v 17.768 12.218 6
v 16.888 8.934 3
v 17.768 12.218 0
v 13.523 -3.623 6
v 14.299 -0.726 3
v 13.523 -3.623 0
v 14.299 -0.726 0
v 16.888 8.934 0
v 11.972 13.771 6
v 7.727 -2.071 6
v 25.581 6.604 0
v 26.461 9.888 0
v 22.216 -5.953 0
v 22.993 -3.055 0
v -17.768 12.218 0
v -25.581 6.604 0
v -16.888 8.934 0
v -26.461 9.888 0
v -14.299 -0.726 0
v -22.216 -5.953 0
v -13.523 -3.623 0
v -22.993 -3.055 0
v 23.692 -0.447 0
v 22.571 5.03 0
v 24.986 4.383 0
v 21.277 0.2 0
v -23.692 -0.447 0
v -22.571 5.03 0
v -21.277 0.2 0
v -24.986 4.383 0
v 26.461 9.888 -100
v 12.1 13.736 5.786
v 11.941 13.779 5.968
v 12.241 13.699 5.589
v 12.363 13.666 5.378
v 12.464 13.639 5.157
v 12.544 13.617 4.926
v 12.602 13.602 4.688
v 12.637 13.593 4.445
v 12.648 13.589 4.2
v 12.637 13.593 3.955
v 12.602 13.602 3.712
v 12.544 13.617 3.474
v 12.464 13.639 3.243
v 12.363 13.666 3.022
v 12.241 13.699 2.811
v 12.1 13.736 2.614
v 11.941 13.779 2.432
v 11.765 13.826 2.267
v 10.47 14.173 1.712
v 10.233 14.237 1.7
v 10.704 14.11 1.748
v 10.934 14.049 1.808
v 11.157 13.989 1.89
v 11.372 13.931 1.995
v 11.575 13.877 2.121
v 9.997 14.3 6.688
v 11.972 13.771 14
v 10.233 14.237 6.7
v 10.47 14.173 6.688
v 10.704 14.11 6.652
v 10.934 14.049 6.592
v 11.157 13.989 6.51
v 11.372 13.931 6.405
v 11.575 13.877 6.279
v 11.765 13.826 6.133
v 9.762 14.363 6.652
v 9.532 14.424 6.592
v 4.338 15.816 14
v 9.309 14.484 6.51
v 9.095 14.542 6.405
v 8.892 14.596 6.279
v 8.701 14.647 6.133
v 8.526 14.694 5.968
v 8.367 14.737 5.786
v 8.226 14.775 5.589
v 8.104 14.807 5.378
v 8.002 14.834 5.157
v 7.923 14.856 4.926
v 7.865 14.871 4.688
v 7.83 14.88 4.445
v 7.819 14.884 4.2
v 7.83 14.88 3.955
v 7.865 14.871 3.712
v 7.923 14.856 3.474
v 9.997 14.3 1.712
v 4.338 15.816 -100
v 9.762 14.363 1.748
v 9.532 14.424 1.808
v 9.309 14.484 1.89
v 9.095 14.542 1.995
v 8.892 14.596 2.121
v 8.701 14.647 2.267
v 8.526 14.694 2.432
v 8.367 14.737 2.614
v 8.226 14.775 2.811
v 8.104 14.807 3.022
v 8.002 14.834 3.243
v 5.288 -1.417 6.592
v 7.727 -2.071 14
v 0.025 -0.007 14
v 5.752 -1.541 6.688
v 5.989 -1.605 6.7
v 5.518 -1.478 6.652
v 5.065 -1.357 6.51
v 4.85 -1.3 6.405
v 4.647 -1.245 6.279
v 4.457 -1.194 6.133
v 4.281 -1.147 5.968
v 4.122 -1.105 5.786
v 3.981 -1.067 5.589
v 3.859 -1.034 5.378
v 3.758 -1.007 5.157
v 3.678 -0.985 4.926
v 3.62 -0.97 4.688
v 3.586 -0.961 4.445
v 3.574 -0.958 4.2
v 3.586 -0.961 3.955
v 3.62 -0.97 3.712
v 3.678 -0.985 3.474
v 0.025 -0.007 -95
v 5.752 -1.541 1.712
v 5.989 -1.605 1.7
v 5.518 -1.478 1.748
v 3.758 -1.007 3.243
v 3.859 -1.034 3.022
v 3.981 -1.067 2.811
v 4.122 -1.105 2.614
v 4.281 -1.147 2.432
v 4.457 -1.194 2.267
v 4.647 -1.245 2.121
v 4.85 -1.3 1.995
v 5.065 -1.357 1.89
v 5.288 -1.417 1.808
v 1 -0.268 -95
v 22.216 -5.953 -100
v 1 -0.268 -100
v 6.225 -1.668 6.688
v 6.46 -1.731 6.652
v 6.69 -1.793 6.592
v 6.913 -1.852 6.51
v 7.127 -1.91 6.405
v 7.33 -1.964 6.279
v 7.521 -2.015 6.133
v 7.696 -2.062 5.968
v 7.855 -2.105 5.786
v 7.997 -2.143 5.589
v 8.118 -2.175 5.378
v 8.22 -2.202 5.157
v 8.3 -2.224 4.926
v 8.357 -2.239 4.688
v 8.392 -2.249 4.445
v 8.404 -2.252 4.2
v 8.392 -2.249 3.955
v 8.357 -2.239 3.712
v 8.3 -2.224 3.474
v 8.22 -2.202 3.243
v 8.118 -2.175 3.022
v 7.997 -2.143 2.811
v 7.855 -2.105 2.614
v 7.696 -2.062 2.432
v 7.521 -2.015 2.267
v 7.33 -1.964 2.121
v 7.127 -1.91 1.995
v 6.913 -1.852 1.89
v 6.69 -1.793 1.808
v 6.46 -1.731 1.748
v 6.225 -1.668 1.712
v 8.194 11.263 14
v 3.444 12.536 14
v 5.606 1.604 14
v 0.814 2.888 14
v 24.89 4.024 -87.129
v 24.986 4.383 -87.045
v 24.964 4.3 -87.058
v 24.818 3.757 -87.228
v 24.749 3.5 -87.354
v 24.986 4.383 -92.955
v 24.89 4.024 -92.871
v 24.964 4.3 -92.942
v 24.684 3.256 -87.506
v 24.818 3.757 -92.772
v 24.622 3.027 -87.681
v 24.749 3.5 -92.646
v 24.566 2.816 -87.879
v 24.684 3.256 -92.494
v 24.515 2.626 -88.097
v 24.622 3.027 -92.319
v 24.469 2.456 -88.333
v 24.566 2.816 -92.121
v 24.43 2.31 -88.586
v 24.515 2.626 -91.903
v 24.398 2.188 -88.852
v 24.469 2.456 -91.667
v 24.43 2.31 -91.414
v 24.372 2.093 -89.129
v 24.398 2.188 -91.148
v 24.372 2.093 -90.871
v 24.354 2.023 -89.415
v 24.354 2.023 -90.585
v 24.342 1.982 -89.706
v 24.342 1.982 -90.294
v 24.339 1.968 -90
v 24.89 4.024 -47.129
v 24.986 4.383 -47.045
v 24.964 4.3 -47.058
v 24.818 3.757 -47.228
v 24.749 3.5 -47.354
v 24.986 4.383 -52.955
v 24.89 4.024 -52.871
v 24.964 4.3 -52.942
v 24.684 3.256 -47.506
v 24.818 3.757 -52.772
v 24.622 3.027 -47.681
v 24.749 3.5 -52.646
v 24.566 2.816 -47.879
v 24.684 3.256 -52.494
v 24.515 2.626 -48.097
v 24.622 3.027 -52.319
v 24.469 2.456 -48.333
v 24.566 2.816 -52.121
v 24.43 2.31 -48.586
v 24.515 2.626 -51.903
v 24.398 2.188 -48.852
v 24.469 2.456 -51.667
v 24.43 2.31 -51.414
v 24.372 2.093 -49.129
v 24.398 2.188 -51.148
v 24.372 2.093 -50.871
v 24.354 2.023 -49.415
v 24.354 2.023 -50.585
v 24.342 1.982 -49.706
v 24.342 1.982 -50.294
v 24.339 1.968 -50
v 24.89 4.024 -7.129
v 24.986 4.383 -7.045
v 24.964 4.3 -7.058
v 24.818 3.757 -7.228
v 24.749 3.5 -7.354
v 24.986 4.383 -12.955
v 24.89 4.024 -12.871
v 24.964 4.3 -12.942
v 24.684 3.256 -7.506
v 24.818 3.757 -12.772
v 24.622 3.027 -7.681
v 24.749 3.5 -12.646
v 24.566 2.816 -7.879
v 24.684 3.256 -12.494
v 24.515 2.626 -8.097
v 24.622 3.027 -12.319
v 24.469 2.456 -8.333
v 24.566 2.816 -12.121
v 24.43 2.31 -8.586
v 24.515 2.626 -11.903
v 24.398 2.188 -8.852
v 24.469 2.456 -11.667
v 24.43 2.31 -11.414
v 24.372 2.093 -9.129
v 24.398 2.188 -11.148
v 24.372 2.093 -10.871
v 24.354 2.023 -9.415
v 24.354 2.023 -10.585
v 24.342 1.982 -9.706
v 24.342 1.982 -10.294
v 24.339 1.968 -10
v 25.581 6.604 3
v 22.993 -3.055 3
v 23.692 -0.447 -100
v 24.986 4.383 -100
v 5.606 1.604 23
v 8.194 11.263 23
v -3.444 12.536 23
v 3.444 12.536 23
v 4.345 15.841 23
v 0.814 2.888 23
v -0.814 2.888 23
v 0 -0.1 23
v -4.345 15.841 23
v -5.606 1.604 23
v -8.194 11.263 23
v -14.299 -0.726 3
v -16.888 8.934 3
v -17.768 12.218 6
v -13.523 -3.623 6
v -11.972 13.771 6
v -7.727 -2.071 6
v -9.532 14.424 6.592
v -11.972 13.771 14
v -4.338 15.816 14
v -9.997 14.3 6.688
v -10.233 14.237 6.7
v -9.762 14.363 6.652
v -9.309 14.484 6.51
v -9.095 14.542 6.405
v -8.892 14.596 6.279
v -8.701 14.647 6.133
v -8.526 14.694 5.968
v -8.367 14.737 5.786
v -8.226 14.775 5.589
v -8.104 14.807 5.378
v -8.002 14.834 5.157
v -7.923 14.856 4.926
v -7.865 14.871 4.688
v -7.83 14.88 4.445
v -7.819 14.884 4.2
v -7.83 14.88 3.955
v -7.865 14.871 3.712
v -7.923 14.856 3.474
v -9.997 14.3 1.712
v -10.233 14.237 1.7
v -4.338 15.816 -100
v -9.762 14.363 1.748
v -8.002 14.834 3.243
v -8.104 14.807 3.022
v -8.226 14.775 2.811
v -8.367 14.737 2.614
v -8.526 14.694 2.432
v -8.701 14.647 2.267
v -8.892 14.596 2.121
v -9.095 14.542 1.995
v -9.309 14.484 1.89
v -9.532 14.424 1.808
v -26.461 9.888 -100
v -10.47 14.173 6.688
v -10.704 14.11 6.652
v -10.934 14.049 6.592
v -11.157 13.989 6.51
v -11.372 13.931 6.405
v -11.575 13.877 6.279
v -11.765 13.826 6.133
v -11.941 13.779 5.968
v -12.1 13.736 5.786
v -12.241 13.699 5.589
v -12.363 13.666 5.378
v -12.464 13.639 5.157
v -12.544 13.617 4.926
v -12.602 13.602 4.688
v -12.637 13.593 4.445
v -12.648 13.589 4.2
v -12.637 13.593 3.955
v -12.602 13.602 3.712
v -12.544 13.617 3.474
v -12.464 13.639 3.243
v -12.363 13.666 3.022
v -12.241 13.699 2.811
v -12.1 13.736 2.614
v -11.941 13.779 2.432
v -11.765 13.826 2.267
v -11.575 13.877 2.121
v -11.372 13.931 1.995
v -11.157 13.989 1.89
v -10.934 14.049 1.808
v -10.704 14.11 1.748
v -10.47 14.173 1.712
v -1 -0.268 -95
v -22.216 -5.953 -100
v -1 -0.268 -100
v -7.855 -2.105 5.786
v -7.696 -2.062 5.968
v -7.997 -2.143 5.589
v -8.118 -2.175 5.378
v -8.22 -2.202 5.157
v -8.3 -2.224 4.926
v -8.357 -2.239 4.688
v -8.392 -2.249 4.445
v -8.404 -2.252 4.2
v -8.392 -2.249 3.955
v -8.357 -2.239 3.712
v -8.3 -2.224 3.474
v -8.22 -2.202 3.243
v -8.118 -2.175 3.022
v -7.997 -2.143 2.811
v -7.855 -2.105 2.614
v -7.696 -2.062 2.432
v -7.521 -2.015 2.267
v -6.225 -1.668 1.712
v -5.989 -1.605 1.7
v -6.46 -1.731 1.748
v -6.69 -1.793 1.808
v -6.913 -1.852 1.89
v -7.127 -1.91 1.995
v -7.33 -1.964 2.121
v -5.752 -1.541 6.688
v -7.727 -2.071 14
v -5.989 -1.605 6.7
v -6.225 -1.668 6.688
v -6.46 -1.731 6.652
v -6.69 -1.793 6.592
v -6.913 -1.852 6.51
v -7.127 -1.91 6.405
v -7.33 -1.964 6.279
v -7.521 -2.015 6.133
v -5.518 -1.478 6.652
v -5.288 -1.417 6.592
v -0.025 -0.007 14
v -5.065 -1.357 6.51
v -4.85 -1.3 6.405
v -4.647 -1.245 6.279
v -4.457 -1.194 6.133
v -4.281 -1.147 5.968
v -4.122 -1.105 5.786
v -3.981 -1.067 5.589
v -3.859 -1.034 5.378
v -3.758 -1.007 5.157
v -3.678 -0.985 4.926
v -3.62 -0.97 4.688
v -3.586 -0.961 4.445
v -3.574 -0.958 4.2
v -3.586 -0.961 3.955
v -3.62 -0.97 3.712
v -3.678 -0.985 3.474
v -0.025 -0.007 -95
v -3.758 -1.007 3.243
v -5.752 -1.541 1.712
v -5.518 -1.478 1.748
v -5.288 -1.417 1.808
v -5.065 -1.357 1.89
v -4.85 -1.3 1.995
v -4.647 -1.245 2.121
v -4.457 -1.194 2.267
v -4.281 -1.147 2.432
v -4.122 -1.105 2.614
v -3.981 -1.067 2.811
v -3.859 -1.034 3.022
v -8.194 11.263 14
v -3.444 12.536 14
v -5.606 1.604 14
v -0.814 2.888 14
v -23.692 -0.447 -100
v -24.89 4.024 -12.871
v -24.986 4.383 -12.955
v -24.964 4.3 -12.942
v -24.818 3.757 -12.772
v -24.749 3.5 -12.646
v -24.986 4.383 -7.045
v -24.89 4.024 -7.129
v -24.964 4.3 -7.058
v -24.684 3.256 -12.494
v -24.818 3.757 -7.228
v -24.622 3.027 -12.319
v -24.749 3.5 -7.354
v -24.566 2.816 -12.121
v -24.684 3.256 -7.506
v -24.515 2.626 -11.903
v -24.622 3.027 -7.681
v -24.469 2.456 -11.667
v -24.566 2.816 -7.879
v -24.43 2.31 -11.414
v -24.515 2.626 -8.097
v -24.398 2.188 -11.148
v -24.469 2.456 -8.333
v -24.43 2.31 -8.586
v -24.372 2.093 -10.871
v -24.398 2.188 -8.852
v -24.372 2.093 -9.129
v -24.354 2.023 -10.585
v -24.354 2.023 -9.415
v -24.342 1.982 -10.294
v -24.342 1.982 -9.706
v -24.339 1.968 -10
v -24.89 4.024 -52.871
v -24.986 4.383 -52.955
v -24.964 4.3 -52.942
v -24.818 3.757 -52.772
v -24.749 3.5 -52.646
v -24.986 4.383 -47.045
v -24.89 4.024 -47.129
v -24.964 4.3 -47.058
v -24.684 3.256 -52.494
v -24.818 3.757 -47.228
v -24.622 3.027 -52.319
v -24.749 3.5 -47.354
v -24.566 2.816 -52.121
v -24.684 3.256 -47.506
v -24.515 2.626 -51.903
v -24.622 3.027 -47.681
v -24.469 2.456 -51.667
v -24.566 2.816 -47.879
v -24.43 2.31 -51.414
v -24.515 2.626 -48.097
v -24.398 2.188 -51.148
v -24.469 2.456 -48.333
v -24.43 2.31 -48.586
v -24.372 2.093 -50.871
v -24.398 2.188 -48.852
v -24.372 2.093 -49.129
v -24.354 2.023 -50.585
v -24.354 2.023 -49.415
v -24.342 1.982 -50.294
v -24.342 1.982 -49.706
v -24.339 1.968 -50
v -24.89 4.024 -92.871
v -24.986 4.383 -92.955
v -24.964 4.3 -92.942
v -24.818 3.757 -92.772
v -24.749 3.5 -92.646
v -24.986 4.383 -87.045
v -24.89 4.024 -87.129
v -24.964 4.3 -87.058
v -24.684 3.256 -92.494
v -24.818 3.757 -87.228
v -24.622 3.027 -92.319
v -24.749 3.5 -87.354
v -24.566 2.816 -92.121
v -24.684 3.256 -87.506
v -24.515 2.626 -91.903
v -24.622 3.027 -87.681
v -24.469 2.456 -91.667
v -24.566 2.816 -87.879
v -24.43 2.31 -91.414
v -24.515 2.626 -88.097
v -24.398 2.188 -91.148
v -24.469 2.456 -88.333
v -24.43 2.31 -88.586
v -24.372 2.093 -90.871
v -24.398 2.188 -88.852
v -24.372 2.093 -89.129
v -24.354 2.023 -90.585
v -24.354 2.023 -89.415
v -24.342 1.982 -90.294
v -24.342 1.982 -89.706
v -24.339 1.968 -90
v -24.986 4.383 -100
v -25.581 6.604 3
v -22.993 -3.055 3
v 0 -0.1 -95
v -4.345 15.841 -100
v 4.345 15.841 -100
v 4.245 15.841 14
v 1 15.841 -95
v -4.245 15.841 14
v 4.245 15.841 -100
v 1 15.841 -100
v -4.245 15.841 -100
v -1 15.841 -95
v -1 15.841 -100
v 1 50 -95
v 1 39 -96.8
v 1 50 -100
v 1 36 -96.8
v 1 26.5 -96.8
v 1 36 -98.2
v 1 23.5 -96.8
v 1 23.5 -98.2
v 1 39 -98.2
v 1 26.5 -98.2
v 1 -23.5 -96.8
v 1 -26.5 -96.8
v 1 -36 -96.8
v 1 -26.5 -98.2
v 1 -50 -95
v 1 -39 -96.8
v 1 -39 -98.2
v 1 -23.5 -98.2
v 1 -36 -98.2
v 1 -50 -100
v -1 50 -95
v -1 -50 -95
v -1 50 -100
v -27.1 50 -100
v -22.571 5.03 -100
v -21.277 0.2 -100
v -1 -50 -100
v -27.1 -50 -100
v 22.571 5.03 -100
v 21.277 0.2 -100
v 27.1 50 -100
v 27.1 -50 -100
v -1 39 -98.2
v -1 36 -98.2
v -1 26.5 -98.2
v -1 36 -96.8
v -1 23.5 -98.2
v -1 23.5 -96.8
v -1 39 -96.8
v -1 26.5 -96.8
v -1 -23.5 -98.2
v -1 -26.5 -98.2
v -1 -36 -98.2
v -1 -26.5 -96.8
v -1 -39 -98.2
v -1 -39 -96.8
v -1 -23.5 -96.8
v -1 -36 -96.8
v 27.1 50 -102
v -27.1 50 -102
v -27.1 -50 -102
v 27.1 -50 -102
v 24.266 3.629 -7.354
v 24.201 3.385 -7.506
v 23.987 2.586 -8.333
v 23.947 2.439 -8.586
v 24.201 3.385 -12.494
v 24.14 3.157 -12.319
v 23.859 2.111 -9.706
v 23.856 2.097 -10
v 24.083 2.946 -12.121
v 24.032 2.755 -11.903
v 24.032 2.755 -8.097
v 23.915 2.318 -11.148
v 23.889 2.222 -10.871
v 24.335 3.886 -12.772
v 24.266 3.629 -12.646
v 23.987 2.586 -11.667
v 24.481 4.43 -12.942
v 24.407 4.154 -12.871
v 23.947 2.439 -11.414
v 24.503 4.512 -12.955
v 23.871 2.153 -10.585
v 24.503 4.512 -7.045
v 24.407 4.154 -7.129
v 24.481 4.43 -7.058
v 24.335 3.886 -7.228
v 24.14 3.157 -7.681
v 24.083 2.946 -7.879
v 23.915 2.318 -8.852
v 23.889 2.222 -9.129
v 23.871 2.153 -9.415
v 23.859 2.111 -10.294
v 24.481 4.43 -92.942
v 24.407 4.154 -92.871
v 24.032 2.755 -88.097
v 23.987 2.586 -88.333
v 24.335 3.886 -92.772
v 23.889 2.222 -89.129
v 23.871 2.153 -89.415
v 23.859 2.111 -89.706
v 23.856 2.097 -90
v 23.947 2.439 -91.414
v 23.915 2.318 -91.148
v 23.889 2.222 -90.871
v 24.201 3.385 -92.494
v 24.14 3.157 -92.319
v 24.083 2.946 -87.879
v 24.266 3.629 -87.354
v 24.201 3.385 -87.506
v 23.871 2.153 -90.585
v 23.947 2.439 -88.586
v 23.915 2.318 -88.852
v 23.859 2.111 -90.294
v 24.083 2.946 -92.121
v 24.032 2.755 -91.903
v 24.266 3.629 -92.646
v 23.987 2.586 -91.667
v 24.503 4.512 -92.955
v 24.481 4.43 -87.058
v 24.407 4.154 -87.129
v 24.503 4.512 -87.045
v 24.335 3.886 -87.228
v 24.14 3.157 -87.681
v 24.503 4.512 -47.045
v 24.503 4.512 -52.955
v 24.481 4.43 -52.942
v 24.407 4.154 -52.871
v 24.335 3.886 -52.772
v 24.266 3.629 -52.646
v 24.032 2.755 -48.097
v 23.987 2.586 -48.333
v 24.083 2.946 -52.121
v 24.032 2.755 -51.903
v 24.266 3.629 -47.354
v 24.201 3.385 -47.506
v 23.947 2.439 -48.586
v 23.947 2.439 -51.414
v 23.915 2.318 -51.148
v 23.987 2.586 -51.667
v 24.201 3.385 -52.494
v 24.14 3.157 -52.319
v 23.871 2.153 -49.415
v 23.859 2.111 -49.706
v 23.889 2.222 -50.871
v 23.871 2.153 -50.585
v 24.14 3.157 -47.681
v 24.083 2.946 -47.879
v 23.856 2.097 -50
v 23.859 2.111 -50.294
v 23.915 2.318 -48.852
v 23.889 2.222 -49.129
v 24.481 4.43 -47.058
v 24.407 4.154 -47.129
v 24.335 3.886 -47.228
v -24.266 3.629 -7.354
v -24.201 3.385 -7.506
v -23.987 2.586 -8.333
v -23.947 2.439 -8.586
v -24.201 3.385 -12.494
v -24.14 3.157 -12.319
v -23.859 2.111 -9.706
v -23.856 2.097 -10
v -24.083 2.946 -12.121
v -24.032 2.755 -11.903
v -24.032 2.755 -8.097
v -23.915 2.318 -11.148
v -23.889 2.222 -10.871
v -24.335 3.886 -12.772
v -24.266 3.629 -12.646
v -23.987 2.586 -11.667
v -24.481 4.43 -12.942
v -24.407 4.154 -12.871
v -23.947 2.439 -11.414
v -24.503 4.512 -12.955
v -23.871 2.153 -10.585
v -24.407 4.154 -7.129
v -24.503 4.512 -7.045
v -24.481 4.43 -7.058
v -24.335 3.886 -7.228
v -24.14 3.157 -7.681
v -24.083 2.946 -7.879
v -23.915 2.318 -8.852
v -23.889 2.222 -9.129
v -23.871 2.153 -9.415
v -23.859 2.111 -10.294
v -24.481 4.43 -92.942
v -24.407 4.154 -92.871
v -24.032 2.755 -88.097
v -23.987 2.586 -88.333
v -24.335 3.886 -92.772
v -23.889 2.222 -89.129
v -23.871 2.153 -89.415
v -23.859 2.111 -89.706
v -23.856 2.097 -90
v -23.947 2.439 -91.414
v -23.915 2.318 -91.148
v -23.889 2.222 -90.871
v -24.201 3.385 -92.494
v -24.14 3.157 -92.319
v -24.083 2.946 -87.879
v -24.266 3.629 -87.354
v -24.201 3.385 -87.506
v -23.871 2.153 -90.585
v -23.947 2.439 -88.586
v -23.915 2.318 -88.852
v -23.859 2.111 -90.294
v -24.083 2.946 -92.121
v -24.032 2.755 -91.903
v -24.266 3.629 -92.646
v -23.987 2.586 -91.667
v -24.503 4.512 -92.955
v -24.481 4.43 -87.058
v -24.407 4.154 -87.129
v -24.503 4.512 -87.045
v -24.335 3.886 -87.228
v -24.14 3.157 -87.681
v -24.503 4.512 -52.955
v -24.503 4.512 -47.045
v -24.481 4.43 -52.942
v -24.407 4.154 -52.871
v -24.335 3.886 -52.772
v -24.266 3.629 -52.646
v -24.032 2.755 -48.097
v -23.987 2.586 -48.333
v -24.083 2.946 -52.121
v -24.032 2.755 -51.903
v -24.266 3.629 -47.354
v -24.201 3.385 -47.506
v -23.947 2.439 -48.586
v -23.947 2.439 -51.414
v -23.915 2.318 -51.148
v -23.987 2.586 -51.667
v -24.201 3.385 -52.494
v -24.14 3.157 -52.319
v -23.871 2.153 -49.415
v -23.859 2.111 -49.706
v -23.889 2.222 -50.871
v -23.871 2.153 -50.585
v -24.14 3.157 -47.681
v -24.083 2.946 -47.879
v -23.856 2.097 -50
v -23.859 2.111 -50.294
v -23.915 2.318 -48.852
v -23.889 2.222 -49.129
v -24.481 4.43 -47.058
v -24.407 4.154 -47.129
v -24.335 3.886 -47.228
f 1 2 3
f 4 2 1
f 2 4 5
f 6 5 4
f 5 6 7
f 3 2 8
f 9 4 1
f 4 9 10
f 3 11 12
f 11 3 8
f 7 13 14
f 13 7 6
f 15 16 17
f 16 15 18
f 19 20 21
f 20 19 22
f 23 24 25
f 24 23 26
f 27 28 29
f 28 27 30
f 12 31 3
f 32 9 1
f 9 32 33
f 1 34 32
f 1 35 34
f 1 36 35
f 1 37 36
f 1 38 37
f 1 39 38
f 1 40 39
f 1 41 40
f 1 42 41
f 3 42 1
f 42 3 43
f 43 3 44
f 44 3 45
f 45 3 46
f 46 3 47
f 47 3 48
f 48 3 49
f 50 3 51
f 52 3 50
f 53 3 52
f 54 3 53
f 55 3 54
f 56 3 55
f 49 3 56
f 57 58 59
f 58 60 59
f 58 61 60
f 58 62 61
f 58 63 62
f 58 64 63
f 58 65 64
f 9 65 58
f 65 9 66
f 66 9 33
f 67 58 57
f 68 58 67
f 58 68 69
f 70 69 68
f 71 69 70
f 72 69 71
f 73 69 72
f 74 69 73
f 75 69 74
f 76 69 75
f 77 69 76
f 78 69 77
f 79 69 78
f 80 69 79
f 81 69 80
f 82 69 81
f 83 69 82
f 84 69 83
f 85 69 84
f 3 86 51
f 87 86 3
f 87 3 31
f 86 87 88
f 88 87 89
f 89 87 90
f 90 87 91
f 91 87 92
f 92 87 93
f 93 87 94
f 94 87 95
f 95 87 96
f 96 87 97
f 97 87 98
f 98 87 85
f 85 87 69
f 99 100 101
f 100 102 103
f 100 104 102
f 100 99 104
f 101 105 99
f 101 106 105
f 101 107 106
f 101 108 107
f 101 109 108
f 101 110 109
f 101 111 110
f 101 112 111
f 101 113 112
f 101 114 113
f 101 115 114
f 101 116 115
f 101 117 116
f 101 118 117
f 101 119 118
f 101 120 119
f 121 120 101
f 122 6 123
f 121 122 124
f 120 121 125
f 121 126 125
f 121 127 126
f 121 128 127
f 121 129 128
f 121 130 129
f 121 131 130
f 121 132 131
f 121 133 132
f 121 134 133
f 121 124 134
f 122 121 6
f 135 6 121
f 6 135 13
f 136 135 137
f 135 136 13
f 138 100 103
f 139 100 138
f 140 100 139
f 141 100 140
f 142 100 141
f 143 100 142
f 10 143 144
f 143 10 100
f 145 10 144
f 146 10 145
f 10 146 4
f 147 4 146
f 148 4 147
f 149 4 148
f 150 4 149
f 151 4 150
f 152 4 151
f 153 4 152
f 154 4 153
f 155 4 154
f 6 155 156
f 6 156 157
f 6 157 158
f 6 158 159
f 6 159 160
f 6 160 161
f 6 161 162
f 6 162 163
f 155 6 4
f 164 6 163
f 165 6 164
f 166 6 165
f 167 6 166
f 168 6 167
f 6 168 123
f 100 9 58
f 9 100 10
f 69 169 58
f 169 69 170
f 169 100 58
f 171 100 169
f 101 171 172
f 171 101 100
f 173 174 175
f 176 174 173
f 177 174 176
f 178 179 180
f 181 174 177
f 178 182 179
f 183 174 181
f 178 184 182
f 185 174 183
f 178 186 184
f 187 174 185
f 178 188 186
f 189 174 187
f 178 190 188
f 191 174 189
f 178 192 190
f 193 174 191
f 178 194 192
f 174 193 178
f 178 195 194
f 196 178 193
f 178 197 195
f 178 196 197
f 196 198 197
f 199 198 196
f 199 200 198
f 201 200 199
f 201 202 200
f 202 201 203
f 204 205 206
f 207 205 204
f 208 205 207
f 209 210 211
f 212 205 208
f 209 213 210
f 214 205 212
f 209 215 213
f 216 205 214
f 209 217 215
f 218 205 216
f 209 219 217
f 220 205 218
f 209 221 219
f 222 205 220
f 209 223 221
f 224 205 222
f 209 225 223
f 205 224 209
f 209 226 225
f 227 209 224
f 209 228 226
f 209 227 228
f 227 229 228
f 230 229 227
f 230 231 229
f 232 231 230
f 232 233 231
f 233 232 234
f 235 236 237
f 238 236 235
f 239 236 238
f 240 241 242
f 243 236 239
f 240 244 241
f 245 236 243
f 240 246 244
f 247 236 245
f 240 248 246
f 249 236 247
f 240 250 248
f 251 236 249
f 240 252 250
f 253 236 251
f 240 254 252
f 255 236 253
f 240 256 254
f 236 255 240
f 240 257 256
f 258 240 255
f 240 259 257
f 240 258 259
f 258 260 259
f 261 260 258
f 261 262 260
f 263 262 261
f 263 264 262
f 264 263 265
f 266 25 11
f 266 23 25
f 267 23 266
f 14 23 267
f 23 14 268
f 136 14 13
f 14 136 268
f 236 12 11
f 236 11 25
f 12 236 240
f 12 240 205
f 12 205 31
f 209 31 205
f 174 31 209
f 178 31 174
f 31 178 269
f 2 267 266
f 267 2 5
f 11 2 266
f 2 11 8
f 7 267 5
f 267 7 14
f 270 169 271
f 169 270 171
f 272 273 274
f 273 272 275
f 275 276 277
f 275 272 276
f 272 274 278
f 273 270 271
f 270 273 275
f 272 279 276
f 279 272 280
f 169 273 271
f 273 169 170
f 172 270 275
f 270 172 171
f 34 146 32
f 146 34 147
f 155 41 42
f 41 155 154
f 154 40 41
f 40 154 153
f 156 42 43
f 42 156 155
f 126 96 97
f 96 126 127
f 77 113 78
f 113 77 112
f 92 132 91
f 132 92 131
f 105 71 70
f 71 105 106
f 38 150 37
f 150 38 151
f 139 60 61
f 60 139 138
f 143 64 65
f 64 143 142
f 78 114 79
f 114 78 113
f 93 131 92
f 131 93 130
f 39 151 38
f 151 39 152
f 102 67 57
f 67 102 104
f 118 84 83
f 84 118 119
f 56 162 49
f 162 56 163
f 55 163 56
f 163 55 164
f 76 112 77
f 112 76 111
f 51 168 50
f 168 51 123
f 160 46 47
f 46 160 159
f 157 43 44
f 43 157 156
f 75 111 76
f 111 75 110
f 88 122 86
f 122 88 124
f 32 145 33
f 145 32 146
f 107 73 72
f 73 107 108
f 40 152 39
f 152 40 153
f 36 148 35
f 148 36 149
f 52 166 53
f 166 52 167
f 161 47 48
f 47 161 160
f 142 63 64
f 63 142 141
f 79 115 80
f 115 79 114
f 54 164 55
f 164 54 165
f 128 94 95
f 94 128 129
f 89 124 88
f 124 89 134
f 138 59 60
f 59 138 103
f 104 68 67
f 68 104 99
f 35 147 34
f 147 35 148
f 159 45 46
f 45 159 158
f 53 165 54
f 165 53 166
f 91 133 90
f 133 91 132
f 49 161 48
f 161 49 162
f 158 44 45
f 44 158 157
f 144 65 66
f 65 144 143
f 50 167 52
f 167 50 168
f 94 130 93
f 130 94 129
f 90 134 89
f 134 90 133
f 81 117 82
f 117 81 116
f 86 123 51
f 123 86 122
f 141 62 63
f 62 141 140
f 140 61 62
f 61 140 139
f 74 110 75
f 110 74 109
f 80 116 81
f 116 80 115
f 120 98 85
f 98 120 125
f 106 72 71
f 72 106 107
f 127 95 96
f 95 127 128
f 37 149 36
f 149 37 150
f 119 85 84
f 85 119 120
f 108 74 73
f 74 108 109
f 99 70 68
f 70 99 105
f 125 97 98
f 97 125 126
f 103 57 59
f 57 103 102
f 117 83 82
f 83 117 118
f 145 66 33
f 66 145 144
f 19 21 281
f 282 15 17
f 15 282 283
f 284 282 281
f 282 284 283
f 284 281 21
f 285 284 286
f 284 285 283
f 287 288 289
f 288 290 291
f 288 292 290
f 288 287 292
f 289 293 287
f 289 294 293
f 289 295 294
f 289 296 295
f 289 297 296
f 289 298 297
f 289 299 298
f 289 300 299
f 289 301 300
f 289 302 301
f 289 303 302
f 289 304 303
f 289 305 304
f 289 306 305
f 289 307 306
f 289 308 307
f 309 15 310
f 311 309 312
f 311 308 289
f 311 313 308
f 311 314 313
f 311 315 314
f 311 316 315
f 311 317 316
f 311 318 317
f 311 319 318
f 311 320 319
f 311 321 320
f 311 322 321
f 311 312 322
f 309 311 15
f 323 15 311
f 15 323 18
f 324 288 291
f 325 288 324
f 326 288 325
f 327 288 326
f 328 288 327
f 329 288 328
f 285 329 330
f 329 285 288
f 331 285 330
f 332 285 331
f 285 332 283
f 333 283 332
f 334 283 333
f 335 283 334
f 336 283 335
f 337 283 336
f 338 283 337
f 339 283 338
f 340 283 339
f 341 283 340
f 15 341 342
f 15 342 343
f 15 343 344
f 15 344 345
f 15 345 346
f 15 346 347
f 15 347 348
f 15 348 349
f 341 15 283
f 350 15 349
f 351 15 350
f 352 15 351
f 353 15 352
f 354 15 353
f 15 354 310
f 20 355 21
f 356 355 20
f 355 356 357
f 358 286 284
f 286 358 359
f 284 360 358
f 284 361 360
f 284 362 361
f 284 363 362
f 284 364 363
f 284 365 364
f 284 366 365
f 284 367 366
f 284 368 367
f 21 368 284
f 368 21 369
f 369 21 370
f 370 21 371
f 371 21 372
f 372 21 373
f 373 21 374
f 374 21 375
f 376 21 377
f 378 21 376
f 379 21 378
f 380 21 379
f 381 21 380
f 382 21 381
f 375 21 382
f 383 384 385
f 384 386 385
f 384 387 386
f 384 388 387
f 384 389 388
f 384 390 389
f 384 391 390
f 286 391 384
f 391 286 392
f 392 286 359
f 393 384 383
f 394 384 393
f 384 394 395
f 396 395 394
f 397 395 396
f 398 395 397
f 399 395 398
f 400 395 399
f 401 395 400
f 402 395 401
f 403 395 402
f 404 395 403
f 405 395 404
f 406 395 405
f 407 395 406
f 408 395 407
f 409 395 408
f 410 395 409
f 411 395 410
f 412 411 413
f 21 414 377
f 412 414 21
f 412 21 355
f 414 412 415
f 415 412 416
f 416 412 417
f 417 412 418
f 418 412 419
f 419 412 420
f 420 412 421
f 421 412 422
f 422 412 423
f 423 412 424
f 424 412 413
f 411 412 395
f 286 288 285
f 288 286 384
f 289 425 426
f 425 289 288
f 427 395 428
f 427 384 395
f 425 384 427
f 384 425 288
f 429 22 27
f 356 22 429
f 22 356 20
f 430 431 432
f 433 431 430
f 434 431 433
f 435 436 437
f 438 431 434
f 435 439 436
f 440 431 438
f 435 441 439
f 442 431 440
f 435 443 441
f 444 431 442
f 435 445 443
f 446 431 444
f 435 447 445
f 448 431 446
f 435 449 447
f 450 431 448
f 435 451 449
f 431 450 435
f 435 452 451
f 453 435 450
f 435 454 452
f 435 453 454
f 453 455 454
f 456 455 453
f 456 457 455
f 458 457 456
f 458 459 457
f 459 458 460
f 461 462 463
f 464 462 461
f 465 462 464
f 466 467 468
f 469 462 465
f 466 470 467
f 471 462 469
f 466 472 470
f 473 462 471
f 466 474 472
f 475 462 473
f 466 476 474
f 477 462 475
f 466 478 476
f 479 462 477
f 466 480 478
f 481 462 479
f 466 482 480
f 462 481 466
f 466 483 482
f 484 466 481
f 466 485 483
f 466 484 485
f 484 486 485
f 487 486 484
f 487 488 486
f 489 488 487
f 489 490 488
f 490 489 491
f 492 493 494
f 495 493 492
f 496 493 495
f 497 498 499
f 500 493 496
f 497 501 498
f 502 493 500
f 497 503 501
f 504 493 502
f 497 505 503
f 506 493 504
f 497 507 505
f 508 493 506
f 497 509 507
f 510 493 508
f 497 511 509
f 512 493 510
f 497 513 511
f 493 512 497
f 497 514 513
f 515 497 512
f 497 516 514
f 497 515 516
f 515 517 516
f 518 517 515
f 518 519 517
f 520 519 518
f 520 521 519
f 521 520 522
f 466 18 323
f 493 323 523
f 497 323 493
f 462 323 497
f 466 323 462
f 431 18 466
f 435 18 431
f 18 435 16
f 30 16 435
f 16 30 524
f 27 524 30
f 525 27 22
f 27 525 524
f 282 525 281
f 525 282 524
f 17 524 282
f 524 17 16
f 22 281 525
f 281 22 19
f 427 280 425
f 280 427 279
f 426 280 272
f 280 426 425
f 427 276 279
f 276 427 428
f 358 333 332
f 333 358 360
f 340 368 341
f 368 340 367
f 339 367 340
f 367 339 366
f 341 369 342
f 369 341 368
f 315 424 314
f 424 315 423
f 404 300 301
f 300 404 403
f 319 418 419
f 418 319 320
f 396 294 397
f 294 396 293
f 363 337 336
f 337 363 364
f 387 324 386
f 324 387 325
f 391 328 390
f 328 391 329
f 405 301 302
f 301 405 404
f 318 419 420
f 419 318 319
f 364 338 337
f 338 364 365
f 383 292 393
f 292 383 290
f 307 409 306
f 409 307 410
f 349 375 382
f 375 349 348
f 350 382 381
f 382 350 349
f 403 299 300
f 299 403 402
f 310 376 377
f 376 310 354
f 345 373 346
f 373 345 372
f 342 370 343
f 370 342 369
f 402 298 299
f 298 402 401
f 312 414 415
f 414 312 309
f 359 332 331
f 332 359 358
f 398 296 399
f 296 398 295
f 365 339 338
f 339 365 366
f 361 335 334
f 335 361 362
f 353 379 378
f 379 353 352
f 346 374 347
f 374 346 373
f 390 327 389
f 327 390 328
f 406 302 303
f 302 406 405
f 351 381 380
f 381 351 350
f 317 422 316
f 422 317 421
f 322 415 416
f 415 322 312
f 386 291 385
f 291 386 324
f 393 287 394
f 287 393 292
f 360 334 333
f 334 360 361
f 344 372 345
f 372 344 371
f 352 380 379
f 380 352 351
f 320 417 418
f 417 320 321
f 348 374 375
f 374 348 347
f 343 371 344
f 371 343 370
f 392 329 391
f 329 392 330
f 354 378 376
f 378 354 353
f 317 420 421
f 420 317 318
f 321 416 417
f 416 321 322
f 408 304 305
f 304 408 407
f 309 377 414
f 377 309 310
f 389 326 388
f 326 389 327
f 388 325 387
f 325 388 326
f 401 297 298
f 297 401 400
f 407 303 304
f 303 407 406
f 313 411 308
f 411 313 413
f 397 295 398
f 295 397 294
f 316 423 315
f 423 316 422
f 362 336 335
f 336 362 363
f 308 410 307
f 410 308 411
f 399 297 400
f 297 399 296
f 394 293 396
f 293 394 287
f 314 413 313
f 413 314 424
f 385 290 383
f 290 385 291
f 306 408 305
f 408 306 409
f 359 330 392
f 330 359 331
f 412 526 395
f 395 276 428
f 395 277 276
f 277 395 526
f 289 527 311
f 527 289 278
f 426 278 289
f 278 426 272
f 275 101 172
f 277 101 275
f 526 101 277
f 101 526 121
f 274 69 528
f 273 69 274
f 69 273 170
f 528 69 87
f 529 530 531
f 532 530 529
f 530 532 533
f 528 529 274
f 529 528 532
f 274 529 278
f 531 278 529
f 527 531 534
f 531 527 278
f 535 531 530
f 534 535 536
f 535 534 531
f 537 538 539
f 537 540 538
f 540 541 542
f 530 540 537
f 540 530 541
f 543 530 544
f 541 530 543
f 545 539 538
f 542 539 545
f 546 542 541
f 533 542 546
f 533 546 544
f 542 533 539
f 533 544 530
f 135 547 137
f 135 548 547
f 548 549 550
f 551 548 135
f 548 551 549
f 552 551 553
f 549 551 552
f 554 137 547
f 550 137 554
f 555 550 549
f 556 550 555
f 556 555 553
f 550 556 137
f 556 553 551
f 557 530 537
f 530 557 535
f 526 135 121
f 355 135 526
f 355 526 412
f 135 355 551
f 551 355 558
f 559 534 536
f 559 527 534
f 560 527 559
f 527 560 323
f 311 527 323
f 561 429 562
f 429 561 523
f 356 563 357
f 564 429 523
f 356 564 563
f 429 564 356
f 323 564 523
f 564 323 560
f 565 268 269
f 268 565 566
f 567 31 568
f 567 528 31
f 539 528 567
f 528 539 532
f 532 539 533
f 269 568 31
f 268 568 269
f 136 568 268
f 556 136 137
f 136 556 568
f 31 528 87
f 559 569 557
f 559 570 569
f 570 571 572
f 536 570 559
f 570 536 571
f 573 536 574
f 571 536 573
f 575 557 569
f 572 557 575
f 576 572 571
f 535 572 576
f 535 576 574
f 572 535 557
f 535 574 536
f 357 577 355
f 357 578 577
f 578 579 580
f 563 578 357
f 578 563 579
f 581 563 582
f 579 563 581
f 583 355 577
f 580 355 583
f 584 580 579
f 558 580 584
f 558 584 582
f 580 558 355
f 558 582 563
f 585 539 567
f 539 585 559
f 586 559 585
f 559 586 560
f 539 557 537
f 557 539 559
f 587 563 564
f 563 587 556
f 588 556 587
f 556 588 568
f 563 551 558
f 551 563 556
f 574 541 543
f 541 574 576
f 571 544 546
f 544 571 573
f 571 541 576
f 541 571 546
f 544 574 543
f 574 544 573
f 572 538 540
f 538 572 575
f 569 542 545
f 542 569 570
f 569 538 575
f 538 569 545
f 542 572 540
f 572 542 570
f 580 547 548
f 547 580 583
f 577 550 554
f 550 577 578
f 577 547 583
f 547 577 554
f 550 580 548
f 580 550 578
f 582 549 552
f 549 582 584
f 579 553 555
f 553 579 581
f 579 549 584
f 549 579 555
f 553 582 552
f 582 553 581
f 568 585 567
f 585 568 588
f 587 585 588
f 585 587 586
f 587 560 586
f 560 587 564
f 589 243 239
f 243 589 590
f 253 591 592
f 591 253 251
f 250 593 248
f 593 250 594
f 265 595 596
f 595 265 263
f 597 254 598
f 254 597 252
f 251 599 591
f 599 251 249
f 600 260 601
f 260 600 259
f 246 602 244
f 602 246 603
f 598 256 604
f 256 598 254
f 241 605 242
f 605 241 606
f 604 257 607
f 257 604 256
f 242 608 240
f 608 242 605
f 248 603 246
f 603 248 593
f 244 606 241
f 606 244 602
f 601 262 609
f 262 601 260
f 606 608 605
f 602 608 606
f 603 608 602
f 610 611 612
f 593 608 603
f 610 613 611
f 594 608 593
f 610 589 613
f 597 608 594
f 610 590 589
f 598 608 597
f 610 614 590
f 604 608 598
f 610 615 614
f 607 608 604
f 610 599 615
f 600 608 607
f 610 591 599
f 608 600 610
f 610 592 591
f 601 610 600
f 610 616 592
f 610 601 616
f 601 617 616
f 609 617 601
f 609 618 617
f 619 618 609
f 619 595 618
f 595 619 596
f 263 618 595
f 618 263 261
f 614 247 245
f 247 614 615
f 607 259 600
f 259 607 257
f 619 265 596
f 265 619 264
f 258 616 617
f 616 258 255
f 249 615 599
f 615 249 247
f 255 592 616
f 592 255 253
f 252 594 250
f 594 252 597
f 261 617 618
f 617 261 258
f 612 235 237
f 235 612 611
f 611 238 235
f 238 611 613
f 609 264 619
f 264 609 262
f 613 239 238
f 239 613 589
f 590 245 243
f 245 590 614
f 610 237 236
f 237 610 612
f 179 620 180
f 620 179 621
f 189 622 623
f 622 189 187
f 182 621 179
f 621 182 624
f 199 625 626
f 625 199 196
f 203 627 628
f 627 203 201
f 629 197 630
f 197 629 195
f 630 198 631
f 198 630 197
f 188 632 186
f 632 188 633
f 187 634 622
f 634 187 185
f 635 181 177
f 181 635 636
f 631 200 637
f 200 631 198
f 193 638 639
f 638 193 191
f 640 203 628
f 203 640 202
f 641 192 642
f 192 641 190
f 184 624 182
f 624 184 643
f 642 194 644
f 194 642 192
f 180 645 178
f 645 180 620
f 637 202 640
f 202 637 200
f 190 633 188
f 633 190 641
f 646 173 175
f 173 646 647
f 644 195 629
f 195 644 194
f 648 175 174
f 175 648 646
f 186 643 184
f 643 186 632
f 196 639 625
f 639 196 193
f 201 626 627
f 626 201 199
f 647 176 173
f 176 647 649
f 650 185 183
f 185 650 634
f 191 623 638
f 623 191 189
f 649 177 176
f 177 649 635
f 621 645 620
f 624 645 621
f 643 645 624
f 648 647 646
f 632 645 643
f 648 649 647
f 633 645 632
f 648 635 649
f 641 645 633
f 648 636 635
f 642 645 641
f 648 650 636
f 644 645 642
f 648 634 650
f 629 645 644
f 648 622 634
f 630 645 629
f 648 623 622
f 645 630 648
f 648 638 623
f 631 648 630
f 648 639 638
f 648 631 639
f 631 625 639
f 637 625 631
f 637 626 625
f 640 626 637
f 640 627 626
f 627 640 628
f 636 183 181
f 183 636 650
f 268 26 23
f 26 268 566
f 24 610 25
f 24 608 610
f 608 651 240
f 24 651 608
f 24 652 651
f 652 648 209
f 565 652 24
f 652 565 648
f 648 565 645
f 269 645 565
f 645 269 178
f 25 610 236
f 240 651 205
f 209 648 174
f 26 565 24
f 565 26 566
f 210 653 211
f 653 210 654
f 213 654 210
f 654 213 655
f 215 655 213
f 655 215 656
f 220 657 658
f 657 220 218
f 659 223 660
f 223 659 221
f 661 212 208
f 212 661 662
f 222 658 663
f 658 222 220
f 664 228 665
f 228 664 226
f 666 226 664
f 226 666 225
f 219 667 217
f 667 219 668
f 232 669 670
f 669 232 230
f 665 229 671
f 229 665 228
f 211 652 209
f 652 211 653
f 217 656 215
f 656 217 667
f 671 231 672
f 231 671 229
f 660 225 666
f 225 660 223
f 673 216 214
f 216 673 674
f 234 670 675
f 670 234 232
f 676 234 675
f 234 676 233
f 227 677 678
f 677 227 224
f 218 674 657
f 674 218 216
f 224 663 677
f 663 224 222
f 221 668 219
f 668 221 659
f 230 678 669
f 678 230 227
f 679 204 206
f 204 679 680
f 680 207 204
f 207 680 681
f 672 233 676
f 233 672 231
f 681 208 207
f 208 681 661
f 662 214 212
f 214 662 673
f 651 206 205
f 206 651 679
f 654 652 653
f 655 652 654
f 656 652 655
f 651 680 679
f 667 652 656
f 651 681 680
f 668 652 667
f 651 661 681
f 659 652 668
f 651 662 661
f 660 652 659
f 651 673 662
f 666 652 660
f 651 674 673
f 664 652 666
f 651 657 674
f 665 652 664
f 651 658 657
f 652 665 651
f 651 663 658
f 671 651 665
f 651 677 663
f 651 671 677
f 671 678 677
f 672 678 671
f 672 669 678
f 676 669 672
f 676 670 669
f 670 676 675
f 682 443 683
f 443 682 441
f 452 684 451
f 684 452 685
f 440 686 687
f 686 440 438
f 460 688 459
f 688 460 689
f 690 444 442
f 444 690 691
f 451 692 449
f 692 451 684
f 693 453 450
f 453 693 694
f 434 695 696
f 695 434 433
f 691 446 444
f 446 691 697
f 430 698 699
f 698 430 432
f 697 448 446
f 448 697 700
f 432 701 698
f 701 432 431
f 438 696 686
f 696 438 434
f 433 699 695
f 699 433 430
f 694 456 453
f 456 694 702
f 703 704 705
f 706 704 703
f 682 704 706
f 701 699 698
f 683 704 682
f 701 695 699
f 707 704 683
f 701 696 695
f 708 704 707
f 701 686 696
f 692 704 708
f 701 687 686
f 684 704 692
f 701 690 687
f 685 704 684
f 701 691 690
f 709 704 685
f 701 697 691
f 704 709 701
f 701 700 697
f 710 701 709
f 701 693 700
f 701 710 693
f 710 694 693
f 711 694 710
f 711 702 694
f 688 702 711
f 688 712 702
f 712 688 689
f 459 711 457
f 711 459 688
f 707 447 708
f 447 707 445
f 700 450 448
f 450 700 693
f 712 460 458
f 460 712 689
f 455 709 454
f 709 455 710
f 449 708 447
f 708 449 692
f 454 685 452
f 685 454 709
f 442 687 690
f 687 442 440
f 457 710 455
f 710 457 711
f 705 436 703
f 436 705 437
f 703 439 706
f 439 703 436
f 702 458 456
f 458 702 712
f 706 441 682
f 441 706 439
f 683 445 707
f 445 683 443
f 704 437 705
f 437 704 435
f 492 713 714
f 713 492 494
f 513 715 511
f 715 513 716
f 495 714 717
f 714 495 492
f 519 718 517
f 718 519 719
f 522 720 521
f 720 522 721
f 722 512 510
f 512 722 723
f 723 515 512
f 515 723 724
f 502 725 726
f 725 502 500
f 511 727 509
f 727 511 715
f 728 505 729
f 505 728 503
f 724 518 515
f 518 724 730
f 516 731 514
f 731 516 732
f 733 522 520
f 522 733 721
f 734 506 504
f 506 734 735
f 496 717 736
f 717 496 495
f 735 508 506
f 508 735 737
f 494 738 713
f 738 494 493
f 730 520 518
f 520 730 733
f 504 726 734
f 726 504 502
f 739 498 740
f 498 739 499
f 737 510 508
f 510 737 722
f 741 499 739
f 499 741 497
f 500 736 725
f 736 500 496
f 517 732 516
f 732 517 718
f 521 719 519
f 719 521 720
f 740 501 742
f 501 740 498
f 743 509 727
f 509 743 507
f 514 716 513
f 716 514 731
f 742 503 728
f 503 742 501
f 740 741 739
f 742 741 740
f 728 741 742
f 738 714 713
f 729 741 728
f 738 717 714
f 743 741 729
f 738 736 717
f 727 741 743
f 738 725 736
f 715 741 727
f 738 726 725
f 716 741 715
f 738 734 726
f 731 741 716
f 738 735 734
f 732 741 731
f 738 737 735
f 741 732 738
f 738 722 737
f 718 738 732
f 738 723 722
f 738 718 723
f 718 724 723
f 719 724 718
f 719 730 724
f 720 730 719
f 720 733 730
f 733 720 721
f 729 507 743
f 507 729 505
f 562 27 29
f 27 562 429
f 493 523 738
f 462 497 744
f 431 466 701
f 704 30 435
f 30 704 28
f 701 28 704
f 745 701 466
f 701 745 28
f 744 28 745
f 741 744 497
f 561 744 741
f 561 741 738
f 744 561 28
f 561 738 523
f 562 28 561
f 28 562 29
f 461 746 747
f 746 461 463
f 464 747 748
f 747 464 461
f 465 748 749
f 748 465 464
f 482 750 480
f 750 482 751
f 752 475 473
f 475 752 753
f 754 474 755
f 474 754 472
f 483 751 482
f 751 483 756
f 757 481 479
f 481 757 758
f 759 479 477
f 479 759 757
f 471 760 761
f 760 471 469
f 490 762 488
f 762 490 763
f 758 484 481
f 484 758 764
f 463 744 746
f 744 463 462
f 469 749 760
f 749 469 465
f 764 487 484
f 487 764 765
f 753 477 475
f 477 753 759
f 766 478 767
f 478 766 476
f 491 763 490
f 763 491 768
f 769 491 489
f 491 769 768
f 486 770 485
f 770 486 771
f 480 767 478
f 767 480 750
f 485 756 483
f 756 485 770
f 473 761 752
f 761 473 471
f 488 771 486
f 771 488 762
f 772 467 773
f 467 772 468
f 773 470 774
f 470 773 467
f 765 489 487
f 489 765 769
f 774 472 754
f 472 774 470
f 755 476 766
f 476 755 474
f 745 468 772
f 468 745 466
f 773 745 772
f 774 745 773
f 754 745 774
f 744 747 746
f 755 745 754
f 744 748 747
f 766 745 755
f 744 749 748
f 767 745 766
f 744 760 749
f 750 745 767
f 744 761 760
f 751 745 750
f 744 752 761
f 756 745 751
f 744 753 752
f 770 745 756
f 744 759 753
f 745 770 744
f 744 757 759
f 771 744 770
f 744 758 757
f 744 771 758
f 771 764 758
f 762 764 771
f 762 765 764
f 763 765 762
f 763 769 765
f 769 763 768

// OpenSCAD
// file: cableslot.scad
module slot(length)
{
    $fn=64;
    difference()
    {
        translate([0,-1.25,0])cube([5,2.5,length],center=true);
        translate([-3,0,0])rotate([90,90,0])cylinder(d=6,h=1,center=true);
        if (length>40)
        {
            translate([-3,0,length/2-10])rotate([90,90,0])cylinder(d=6,h=1,center=true);
            translate([-3,0,-length/2+10])rotate([90,90,0])cylinder(d=6,h=1,center=true);
        }
            
    }
}

z=10;
x=10;
y=5;
difference()
{
    cube([x,y,z],center=true);
    translate([0,y/2,0])slot(z);
}
// file: twocorner.scad
use <onecorner.scad>


module prism(l, w, h) {
       polyhedron(points=[
               [0,0,h],           // 0    front top corner
               [-w,0,0],[w,0,0],   // 1, 2 front left & right bottom corners
               [0,l,h],           // 3    back top corner
               [-w,l,0],[w,l,0]    // 4, 5 back left & right bottom corners
       ], faces=[ // points for all faces must be ordered clockwise when looking in
               [0,2,1],    // top face
               [3,4,5],    // base face
               [0,1,4,3],  // h face
               [1,2,5,4],  // w face
               [0,3,5,2],  // hypotenuse face
       ]);
}


module twocorner(angle=0)
{

    offset=2;
    rotate([0,0,-angle/2])onecorner(offset);
    rotate([0,0,angle/2])mirror([1,0,0])onecorner(offset);

    if (angle > 0)
    {       
        translate([0,cos(angle/2)*fanwidth(),0])rotate([90,0,0])prism(tablength(),sin(angle/2)*fanwidth()+0.1,cos(angle/2)*fanwidth()+0.1);
    }
}


twocorner(30);

 
// file: onecorner.scad
use <../threads/isothreads.scad>


$fn=0;

fullwidth=16.4;
narrolength=23;

// Functions to pass variables up to user of this module
function fanwidth()=fullwidth;
function tablength()=narrolength;

function segments (diameter) = min (($fn < 0.01) ? 50 : 2, ceil (diameter*6));

module frame(padding)
{
    fullthick=6.0;
    fulllength=14;
    narrothick=3;
    narrowidth=10;
    
    cube([fulllength,fullwidth,fullthick],center=false);
    cube([fullthick+padding,fullwidth,fulllength],center=false);
    
    translate([0,3,0])cube([narrolength,narrowidth,narrothick],center=false);
    translate([0,3,0])cube([narrothick+padding,narrowidth,narrolength],center=false);
}

module onecorner(padding=0,thread=false)
{
    holecenter=4.2;
    
    difference()
    {
        frame(padding);
        translate([holecenter+padding,0,holecenter])rotate([-90,0,0])
            if (thread)           
                {m4thread();}
            else
                {m4hole();}
    }
}


module m4hole()
{
    $fn=64;
    height=20;
    translate([0,0,height/2])cylinder(d=5,h=height,center=true);
}

module m4thread()
{
    height=20;
    translate([0,0,0])metric_thread (diameter=8, pitch=1, length=height);   
}

onecorner(3);
//m4thread();
//m4hole();
// main file
use <onecorner.scad>
use <twocorner.scad>
use <cableslot.scad>

module oneleg(height)
{
    difference()
    {
        cube([tablength(),fanwidth(),height],center=false);
        translate([tablength(),fanwidth()/2,height/2])rotate([0,0,-90])slot(height);
    }
}
module leg(angle=0,height=10)
{
   translate([0,0,-height])rotate([0,0,-angle/2]) oneleg(height);
   translate([0,0,-height])rotate([0,0,angle/2])mirror([1,0,0])oneleg(height);
    
    
   if (angle > 0)
    {       
        translate([0,cos(angle/2)*fanwidth(),-height])rotate([90,0,0])prism(height,sin(angle/2)*fanwidth()+0.1,cos(angle/2)*fanwidth()+0.1);
    }
}

module foot(height)
{
    footY=100;
    footZ=2;
    ribX=2;
    ribZ=5;
    translate([0,0,-height-footZ/2]) cube([tablength()*2+fanwidth()/2,footY,footZ],center=true);
    
    //Strengthening ribs and cable tie holder
    difference()
    {
        translate([0,0,-height+ribZ/2]) cube([ribX,footY,ribZ],center=true);
        translate([0,footY/4,-height+ribZ/2]) cube([ribX,3,1.4],center=true);
        translate([0,3*footY/8,-height+ribZ/2]) cube([ribX,3,1.4],center=true);
        translate([0,-footY/4,-height+ribZ/2]) cube([ribX,3,1.4],center=true);
        translate([0,-3*footY/8,-height+ribZ/2]) cube([ribX,3,1.4],center=true);
    }
}


module stand(angle=0,height=100)
{
    twocorner(angle);
    foot(height);    
    leg(angle,height);
}

stand(30,100);
